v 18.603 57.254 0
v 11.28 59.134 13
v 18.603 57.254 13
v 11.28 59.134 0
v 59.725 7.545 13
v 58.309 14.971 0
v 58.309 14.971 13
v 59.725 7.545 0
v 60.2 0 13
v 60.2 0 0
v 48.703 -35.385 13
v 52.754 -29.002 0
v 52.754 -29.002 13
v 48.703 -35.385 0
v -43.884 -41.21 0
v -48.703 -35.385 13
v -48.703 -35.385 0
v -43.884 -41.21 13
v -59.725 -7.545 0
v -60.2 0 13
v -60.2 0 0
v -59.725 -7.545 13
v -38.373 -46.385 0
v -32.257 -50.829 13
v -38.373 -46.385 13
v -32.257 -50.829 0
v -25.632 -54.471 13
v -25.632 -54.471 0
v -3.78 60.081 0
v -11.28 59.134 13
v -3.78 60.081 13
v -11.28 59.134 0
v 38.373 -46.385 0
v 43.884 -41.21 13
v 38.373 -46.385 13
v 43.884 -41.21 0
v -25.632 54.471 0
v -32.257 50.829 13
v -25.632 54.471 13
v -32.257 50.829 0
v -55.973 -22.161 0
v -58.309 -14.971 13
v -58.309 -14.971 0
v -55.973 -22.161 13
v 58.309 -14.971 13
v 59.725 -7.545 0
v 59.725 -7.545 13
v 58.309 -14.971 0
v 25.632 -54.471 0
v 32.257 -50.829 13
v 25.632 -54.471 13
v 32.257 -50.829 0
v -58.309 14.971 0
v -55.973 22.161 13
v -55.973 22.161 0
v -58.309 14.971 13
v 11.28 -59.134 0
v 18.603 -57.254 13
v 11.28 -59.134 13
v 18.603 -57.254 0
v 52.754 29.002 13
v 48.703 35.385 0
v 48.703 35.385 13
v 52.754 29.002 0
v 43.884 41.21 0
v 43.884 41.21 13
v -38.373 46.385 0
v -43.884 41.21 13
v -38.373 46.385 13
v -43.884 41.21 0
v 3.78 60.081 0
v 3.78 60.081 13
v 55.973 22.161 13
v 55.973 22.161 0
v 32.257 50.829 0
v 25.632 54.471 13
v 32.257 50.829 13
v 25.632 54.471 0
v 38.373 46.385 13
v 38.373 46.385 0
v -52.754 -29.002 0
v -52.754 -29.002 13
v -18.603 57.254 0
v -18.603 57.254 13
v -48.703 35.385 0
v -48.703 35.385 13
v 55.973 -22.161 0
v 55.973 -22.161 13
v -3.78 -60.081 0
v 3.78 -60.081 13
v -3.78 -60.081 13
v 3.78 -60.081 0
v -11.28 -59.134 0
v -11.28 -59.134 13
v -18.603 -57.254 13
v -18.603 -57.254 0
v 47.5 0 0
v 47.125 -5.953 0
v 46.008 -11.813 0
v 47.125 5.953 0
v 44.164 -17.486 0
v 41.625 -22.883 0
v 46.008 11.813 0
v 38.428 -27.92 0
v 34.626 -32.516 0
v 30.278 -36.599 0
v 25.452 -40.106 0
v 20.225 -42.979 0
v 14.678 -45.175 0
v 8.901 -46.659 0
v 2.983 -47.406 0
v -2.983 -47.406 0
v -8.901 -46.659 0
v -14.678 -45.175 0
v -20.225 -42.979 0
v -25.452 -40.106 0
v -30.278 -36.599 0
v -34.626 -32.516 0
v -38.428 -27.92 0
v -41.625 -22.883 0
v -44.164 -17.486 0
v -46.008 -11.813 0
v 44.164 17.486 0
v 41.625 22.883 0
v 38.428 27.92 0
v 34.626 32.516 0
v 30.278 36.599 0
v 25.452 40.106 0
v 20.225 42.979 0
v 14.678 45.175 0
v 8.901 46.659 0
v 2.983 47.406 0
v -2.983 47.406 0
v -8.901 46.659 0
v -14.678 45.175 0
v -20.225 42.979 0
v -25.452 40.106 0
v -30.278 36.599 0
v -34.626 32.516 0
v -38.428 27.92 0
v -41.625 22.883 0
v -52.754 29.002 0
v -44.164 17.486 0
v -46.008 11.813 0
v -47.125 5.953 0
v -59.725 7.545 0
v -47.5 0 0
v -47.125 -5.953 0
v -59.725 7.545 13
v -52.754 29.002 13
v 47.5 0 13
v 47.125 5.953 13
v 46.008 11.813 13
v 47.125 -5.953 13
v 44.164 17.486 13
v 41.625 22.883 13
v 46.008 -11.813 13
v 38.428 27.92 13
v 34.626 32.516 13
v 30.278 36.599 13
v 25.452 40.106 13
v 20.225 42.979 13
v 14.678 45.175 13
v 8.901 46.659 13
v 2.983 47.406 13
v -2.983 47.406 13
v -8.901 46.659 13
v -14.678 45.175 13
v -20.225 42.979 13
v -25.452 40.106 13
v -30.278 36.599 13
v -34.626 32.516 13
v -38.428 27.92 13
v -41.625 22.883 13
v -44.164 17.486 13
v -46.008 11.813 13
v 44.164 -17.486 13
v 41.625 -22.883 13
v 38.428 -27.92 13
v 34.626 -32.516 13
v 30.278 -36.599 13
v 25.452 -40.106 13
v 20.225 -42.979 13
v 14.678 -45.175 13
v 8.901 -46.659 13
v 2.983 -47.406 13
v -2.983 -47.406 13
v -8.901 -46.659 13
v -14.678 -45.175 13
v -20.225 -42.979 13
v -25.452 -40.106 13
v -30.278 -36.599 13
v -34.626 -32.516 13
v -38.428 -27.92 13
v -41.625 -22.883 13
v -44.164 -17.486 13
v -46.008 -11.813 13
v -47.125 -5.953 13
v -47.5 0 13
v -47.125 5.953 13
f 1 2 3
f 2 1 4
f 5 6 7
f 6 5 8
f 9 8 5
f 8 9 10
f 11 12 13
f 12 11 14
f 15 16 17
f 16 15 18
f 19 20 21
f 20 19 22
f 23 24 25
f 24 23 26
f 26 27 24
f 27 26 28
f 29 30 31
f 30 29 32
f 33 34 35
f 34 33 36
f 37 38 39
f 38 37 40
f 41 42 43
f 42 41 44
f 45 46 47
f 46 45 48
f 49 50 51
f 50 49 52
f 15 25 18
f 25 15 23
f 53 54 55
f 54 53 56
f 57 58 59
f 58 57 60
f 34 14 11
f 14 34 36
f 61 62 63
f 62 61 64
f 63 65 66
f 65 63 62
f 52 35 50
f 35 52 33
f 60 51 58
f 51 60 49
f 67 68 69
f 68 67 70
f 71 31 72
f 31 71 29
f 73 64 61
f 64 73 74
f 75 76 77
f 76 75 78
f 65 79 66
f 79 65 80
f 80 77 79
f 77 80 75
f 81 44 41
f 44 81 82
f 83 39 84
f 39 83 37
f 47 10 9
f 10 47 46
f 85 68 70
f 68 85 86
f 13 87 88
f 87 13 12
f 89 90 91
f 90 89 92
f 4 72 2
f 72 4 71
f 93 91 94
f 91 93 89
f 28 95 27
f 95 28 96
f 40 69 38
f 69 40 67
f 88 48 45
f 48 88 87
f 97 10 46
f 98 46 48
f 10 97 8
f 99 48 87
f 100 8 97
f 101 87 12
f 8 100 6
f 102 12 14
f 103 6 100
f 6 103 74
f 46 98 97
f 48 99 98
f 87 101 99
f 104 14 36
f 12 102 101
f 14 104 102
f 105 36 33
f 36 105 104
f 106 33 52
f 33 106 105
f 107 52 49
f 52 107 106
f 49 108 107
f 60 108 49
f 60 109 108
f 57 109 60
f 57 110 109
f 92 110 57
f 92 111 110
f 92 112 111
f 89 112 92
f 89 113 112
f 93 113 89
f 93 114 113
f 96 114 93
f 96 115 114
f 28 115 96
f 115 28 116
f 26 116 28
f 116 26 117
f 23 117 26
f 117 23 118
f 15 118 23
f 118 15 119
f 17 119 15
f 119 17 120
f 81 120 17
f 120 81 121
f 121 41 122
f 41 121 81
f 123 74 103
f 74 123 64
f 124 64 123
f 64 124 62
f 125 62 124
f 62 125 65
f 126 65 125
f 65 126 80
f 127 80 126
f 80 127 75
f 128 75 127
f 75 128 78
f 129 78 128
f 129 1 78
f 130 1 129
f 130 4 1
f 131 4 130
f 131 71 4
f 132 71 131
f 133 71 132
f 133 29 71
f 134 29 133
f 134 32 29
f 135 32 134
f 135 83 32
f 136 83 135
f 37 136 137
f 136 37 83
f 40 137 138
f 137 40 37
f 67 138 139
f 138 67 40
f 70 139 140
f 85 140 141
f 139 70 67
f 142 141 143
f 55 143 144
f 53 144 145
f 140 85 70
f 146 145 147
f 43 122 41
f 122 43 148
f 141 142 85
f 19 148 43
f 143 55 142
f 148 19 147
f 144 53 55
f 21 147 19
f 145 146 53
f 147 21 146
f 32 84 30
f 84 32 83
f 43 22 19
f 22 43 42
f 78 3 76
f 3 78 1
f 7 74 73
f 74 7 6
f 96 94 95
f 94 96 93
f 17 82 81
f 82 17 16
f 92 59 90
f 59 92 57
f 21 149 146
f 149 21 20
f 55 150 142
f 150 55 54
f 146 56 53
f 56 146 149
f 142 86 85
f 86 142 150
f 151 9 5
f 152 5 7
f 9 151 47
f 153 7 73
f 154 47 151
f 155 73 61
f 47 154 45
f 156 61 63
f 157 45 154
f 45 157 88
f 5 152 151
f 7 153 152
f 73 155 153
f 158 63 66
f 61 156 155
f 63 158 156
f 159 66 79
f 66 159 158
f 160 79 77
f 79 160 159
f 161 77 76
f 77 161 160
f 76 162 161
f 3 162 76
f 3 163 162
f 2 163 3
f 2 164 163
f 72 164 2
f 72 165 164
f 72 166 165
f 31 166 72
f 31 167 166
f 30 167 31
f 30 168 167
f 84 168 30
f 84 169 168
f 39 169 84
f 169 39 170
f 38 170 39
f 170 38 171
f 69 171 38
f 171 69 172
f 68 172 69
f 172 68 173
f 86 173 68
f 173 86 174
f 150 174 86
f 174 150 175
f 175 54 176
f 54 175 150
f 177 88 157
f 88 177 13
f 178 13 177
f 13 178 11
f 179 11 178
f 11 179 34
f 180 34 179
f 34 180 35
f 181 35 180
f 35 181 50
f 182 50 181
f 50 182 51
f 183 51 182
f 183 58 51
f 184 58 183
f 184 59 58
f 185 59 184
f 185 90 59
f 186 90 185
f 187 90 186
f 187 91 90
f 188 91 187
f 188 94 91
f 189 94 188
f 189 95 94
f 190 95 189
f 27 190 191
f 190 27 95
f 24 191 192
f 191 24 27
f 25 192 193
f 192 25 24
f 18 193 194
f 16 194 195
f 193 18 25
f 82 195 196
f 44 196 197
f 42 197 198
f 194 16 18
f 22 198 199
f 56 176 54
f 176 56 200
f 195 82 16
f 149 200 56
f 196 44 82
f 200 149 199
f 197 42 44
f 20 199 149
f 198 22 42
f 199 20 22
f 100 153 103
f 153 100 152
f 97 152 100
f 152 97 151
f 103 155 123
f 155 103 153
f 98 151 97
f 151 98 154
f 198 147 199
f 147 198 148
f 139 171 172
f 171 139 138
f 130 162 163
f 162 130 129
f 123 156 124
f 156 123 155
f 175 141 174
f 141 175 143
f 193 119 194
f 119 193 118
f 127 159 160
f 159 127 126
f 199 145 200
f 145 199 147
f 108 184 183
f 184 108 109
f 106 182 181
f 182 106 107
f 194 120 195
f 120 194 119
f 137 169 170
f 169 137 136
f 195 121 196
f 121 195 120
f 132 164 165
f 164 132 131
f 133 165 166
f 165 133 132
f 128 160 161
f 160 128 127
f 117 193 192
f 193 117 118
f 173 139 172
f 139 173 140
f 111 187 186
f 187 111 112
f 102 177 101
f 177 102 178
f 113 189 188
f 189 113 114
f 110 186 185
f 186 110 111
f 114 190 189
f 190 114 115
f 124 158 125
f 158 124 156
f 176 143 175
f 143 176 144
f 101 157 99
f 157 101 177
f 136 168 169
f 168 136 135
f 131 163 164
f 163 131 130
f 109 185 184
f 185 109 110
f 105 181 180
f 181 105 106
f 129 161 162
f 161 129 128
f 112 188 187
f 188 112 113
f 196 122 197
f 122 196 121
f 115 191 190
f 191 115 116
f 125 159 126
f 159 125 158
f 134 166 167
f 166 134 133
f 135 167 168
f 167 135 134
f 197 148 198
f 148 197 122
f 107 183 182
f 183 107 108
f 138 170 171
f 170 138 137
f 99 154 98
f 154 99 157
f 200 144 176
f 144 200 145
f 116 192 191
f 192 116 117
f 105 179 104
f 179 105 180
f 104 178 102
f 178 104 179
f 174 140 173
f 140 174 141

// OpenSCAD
$fn = 50;


difference() {
	union() {
		cylinder(h = 13, r = 60.2000000000);
	}
	union() {
		cylinder(h = 13, r = 47.5000000000);
	}
}
